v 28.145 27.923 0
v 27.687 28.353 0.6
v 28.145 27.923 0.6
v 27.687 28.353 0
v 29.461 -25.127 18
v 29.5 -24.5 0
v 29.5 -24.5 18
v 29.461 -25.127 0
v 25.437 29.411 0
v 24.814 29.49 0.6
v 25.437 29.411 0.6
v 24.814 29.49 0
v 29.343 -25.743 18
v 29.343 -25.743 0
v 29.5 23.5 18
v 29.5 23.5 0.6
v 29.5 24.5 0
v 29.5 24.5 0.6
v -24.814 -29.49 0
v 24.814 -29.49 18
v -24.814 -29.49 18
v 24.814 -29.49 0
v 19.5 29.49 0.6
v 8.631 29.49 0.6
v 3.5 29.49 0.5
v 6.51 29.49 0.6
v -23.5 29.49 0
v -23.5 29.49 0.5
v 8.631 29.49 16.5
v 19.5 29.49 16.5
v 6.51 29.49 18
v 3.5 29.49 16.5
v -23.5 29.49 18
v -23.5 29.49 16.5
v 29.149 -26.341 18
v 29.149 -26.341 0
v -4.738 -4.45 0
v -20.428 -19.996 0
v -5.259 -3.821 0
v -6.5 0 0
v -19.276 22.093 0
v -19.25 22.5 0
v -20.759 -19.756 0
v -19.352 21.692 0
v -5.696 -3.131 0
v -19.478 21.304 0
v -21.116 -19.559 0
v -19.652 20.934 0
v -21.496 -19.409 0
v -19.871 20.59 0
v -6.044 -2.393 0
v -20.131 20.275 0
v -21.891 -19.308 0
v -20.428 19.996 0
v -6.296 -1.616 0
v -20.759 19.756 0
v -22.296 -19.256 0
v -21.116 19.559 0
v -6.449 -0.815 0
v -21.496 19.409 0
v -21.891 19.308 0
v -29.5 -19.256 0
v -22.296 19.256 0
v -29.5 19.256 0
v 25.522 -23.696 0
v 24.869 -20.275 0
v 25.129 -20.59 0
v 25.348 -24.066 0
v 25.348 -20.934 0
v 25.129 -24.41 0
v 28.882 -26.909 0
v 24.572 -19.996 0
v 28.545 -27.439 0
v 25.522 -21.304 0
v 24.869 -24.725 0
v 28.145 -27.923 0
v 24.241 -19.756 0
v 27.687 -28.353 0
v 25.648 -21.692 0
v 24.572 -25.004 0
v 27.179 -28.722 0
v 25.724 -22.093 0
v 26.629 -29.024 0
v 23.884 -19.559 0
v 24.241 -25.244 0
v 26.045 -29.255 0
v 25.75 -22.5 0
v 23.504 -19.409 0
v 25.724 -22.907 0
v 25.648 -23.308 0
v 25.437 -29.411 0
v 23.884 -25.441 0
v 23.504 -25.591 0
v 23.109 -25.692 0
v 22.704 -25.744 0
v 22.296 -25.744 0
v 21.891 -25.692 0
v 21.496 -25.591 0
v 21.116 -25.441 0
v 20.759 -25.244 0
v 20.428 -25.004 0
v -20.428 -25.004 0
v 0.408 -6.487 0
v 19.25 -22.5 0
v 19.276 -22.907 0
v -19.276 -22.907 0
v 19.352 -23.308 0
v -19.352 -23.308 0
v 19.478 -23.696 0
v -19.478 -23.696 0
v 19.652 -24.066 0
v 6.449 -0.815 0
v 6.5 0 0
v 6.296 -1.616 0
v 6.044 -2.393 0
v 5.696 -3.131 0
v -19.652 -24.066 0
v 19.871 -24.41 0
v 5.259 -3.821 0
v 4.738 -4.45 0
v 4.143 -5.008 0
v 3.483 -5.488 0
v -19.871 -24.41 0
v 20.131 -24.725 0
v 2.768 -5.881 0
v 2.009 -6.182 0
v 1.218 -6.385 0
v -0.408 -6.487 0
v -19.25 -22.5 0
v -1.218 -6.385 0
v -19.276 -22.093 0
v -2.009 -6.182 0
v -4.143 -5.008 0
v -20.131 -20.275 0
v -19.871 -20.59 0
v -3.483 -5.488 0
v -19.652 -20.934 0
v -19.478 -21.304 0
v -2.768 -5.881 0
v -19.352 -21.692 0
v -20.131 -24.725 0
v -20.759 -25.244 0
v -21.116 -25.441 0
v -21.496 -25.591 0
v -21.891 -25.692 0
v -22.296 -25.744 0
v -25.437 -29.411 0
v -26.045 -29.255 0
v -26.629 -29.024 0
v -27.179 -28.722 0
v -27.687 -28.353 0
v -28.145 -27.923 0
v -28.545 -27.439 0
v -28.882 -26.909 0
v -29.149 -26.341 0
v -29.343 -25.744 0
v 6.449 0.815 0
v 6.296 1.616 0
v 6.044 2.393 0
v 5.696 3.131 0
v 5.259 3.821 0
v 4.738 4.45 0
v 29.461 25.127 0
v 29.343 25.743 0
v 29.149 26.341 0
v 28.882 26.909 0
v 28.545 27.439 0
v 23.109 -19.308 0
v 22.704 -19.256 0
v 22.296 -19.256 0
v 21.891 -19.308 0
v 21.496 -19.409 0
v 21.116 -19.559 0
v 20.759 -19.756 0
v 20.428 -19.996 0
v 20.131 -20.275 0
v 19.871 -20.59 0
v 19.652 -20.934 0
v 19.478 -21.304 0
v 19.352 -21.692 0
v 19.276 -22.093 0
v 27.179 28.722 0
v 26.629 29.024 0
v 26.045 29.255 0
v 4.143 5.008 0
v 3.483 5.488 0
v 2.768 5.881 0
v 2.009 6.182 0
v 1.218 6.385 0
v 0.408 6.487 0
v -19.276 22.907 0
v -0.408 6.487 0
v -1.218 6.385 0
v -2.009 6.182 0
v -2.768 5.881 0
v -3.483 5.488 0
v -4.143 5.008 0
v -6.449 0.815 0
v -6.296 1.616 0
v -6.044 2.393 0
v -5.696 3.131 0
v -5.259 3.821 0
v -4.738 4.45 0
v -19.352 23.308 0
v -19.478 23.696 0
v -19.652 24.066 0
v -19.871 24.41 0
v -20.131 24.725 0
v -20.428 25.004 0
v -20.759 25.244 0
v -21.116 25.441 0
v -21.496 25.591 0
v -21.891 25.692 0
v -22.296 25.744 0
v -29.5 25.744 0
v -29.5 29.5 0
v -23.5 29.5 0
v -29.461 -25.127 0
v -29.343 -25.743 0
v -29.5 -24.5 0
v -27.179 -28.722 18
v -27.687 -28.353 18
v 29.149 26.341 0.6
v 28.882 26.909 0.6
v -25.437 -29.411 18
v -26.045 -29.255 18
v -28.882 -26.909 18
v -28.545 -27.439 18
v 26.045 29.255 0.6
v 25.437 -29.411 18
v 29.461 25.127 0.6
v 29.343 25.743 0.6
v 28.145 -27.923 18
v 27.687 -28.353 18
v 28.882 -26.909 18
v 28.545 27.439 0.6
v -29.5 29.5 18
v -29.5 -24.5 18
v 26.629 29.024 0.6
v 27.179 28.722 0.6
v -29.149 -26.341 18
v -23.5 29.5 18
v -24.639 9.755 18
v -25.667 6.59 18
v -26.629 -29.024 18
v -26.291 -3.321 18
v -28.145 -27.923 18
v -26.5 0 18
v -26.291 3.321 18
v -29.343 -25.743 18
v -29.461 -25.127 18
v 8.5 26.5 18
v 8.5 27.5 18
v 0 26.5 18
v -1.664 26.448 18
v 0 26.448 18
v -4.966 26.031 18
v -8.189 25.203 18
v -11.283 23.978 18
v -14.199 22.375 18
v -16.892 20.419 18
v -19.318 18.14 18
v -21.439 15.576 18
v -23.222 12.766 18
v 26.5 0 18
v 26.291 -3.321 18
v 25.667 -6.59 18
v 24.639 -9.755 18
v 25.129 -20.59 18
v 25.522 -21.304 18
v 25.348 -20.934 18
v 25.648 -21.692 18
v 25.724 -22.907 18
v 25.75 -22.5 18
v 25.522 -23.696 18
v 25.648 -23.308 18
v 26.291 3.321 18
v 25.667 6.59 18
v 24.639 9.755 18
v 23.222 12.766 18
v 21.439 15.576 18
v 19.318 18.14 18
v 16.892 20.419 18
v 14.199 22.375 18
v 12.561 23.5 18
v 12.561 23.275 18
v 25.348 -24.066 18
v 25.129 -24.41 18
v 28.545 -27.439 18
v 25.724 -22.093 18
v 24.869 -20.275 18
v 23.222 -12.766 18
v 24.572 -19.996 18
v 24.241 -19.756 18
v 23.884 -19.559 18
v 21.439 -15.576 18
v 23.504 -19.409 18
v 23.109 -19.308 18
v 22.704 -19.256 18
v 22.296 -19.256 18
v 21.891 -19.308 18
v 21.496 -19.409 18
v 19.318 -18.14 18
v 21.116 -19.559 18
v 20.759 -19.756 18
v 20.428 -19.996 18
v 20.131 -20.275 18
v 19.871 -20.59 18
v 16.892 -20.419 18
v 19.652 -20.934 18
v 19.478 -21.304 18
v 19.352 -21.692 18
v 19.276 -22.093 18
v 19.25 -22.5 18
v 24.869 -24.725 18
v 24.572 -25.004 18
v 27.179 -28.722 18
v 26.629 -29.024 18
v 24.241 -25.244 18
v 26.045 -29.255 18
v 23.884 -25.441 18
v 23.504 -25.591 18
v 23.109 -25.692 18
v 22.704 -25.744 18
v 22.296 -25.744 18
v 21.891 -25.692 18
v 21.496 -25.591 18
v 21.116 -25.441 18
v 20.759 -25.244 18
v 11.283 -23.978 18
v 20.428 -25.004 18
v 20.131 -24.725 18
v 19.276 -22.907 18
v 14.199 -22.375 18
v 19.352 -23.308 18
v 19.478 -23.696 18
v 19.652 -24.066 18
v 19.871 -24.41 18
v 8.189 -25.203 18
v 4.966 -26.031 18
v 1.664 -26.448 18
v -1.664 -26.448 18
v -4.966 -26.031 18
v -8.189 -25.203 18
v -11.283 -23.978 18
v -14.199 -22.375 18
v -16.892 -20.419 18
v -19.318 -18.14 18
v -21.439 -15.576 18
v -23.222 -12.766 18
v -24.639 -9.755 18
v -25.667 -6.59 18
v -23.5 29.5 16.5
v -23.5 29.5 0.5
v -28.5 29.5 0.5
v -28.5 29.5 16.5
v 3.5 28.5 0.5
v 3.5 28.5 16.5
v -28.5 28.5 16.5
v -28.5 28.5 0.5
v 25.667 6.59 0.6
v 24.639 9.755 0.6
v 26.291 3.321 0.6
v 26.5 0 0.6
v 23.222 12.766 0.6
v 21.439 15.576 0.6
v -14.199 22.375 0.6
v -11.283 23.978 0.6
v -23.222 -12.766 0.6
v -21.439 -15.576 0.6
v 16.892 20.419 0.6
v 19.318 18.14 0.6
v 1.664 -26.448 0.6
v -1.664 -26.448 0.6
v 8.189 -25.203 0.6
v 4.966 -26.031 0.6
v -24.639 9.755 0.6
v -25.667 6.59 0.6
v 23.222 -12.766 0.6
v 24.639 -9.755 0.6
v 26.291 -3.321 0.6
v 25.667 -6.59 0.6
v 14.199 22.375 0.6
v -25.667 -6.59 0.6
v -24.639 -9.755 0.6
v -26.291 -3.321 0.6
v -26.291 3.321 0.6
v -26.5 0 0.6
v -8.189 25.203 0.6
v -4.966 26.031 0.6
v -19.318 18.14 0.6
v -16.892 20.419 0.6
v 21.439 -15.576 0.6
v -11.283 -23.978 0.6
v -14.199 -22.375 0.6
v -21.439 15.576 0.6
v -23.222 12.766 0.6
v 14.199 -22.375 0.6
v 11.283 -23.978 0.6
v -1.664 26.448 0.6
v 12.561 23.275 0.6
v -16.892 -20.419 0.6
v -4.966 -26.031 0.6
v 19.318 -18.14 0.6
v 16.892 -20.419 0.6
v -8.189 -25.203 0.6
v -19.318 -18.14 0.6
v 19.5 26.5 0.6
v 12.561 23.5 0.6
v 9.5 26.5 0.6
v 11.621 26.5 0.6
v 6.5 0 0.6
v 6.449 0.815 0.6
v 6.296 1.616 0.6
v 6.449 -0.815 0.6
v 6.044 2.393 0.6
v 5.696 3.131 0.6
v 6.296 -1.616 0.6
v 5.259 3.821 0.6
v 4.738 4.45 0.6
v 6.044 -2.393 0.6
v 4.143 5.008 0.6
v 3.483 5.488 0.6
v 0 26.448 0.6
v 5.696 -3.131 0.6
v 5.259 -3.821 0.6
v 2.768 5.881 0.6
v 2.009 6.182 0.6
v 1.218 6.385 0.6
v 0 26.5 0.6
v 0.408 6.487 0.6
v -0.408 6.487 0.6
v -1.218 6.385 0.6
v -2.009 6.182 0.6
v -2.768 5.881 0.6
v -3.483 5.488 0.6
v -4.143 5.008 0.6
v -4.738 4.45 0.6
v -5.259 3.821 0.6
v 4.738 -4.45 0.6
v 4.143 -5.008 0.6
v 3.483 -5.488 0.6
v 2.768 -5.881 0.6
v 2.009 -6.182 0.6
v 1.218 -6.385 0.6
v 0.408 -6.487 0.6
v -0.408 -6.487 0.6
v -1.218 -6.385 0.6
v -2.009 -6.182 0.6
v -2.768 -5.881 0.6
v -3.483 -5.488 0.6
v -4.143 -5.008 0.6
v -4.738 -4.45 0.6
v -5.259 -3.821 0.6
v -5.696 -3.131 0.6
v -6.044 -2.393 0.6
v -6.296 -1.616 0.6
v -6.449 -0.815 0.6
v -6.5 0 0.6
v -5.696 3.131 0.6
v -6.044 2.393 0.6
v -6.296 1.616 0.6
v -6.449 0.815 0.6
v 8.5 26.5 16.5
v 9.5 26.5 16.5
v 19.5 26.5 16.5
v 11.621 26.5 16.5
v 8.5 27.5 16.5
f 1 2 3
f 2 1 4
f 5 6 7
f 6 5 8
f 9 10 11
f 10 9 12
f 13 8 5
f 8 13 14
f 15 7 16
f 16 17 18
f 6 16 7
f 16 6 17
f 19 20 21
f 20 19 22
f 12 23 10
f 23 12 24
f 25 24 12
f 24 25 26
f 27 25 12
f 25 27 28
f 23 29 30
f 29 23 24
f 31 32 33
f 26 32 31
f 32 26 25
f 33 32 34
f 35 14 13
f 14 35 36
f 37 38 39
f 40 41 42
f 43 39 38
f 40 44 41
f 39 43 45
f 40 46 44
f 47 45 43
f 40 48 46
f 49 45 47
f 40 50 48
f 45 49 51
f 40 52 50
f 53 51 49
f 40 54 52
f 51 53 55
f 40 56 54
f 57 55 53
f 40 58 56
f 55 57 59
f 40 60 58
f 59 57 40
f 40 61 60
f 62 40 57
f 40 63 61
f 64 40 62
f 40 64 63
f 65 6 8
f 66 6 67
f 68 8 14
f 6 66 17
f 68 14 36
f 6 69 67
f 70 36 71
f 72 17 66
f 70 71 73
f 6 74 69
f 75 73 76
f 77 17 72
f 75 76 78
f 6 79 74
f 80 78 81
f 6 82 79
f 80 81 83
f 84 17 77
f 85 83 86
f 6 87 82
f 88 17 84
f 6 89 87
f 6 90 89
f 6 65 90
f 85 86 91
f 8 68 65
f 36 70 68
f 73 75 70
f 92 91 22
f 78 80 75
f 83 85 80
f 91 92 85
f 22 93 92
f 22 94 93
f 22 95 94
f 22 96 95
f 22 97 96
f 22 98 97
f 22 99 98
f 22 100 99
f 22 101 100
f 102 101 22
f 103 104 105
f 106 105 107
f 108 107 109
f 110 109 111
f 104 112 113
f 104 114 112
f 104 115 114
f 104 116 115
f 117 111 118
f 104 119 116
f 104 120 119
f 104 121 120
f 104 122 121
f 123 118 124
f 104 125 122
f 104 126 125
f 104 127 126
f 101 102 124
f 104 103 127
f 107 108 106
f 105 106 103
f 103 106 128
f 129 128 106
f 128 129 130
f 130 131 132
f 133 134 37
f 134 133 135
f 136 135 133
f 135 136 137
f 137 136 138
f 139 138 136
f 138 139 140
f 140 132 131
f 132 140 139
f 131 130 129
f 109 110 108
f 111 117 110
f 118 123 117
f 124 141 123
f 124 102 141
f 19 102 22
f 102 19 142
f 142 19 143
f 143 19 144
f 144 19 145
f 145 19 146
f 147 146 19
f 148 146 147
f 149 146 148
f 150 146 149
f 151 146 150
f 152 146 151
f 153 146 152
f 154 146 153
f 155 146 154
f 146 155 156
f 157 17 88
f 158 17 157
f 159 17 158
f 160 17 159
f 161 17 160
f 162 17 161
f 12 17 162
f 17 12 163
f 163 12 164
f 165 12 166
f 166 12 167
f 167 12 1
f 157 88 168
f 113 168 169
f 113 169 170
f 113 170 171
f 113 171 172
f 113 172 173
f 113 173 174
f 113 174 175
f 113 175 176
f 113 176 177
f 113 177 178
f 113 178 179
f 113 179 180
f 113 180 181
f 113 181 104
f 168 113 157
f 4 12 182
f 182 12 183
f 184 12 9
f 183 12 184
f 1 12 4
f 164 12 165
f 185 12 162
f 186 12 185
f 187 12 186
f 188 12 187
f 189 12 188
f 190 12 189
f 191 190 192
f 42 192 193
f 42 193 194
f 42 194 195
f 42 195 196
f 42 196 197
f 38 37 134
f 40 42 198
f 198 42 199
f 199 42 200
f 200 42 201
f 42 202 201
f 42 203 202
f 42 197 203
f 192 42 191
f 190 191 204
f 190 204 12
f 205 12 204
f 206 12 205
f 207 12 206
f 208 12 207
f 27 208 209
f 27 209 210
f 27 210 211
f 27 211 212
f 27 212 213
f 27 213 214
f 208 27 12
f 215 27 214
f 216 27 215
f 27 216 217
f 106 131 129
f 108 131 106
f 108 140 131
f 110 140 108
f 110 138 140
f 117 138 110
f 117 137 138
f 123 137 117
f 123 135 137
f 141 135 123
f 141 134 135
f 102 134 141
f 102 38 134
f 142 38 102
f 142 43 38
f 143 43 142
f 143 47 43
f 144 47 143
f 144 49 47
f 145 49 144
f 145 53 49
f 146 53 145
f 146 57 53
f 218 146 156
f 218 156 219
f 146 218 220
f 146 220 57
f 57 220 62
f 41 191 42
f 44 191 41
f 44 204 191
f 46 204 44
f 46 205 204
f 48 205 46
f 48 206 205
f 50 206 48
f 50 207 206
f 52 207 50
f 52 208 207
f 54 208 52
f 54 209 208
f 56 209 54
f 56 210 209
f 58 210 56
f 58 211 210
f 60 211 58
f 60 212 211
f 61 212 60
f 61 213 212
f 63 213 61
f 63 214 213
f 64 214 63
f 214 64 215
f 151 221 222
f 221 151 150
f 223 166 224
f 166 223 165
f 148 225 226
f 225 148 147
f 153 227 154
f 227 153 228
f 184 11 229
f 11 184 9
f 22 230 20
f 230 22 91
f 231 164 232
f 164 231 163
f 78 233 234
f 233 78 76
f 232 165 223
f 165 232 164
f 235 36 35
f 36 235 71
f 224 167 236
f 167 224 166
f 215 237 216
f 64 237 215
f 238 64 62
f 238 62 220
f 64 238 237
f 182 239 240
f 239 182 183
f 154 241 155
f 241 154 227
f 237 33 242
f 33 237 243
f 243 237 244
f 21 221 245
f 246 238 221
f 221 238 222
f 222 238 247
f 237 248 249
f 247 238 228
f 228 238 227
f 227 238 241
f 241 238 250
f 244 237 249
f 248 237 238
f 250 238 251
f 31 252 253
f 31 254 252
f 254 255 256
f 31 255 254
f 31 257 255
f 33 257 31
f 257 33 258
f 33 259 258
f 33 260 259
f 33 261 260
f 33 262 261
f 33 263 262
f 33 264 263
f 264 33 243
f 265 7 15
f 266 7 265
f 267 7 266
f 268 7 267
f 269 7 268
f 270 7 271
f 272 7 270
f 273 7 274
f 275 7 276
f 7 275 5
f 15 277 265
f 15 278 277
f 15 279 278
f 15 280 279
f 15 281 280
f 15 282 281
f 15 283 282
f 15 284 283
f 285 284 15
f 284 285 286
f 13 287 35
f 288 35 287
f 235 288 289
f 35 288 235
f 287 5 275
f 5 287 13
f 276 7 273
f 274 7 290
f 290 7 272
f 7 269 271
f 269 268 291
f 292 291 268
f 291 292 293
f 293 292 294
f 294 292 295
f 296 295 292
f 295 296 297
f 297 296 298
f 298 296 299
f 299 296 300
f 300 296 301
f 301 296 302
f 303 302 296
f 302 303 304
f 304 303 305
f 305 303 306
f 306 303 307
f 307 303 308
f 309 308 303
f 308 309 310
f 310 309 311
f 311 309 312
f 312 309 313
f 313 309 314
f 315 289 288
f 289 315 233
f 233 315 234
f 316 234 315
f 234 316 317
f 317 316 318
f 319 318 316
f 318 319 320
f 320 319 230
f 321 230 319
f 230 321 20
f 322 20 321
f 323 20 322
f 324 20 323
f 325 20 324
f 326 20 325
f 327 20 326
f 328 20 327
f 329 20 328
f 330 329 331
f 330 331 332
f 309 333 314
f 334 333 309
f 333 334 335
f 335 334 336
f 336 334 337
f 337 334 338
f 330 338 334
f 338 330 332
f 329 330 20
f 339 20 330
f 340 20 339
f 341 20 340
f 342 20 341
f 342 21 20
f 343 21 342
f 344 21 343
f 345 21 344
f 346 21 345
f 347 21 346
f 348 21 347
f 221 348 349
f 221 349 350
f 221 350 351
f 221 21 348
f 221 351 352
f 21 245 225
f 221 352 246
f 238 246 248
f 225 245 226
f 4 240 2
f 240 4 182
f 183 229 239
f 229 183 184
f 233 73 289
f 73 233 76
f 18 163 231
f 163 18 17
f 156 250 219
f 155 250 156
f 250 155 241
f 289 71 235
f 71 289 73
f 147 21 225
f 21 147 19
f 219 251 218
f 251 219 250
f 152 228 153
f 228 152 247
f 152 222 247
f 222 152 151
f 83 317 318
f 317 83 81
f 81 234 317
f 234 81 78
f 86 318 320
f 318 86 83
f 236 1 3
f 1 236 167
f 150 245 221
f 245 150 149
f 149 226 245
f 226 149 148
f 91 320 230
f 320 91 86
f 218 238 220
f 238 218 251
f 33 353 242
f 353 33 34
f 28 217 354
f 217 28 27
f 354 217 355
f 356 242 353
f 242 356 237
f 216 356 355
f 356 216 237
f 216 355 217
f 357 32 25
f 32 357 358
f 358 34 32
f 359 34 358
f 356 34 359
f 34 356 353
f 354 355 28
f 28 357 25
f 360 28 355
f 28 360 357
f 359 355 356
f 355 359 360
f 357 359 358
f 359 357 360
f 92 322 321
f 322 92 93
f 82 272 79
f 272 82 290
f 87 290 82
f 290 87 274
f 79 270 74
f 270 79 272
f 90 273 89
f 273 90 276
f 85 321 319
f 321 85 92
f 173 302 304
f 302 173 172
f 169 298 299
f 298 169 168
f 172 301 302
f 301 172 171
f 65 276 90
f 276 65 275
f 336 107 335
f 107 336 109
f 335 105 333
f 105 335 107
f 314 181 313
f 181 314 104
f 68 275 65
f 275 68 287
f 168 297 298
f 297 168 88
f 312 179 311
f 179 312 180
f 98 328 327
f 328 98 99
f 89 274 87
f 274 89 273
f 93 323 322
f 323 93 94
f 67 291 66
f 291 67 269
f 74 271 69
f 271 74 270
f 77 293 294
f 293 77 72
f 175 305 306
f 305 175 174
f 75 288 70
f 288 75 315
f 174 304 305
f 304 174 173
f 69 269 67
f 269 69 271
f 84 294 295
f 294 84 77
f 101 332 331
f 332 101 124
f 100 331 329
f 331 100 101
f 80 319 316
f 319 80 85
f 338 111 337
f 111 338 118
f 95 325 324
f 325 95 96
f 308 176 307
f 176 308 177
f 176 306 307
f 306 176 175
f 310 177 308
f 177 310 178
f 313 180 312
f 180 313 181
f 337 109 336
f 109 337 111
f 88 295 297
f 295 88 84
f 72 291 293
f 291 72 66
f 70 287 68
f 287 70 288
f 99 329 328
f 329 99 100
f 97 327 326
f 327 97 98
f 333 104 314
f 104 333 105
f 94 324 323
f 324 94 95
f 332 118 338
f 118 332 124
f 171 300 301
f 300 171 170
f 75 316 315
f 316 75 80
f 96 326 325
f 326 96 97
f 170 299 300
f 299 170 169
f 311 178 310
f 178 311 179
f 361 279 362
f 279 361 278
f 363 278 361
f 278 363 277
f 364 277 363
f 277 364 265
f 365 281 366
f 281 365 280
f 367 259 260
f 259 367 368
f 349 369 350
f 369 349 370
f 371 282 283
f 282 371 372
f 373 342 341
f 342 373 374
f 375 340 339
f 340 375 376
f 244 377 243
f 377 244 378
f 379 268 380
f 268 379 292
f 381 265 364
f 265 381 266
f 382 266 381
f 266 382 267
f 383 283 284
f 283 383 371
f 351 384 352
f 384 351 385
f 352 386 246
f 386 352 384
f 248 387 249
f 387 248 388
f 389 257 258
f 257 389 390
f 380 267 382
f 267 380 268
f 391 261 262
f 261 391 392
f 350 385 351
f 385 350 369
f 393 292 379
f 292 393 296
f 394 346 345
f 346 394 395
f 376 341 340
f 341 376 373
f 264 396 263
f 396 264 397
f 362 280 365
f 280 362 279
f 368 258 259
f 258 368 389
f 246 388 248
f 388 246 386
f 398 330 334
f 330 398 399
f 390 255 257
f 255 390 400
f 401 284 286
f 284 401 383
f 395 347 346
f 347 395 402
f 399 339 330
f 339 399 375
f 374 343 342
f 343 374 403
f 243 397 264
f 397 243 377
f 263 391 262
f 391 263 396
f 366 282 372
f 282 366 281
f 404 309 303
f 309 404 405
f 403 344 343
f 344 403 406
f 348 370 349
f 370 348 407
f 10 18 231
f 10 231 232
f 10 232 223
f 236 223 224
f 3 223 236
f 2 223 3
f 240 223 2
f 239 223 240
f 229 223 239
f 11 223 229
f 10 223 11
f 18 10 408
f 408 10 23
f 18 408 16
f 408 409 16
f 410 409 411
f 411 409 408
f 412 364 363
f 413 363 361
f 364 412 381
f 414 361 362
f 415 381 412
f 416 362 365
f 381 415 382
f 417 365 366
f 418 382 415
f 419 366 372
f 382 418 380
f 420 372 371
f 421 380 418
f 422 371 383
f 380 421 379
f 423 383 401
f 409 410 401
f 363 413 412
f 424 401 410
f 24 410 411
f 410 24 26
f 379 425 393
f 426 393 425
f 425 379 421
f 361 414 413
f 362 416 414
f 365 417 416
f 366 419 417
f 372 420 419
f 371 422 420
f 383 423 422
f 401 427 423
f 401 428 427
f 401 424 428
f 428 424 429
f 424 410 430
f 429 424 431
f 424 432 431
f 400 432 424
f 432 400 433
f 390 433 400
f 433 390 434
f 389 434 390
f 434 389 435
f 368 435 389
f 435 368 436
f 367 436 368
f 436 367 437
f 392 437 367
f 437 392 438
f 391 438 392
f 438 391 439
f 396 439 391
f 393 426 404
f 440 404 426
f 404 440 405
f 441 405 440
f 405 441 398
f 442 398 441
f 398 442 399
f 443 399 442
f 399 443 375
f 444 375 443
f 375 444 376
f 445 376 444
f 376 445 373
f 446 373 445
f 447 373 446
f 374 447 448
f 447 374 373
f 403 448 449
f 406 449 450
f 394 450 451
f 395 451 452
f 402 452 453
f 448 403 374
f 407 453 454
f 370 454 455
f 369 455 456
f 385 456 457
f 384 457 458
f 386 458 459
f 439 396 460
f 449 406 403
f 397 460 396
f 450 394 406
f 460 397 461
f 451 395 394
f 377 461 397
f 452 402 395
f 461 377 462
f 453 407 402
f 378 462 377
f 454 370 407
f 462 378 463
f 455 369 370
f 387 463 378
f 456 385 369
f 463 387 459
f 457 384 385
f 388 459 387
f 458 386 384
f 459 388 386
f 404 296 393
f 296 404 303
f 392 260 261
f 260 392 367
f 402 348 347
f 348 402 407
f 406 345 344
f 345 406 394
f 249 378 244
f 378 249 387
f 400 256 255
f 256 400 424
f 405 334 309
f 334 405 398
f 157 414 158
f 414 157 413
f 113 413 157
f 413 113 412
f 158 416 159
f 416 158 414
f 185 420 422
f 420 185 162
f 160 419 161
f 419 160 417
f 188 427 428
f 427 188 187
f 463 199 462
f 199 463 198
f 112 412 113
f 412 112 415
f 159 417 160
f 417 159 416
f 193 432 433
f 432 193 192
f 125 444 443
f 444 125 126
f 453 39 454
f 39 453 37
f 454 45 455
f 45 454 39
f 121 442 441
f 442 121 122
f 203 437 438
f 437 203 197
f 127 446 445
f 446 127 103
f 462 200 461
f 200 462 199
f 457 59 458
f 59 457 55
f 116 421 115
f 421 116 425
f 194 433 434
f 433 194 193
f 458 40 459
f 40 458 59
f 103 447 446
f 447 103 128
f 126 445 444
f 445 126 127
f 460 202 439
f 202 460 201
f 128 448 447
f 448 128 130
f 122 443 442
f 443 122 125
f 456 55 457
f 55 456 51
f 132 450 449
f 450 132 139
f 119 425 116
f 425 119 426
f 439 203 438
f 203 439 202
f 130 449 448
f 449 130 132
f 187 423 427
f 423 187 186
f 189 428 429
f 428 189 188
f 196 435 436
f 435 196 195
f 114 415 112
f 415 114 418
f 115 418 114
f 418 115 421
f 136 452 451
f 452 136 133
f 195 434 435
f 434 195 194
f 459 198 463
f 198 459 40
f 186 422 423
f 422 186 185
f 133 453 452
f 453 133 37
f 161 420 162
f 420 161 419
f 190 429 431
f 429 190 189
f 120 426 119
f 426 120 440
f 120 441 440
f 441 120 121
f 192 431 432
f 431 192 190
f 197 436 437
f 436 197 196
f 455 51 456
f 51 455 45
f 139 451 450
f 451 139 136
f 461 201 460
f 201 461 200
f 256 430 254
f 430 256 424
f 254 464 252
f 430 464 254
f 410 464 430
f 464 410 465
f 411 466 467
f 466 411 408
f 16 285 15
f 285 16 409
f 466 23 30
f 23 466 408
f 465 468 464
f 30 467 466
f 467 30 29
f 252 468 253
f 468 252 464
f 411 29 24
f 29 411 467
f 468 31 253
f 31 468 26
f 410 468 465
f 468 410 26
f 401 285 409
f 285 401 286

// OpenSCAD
$fn = 50;


difference() {
	union() {
		hull() {
			translate(v = [-24.5000000000, 24.5000000000, 0]) {
				cylinder(h = 18, r = 5);
			}
			translate(v = [24.5000000000, 24.5000000000, 0]) {
				cylinder(h = 18, r = 5);
			}
			translate(v = [-24.5000000000, -24.5000000000, 0]) {
				cylinder(h = 18, r = 5);
			}
			translate(v = [24.5000000000, -24.5000000000, 0]) {
				cylinder(h = 18, r = 5);
			}
		}
		translate(v = [-29.5000000000, 23.5000000000, 0]) {
			cube(size = [6, 6, 18]);
		}
	}
	union() {
		translate(v = [-30.0000000000, -22.5000000000, -250.0000000000]) {
			rotate(a = [0, 0, 0]) {
				difference() {
					union() {
						hull() {
							translate(v = [7.5000000000, 0, 0]) {
								cylinder(h = 250, r = 3.2500000000, r1 = 3.2500000000, r2 = 3.2500000000);
							}
							translate(v = [-7.5000000000, 0, 0]) {
								cylinder(h = 250, r = 3.2500000000, r1 = 3.2500000000, r2 = 3.2500000000);
							}
						}
					}
					union();
				}
			}
		}
		translate(v = [-30.0000000000, 22.5000000000, -250.0000000000]) {
			rotate(a = [0, 0, 0]) {
				difference() {
					union() {
						hull() {
							translate(v = [7.5000000000, 0, 0]) {
								cylinder(h = 250, r = 3.2500000000, r1 = 3.2500000000, r2 = 3.2500000000);
							}
							translate(v = [-7.5000000000, 0, 0]) {
								cylinder(h = 250, r = 3.2500000000, r1 = 3.2500000000, r2 = 3.2500000000);
							}
						}
					}
					union();
				}
			}
		}
		translate(v = [-28.5000000000, 28.5000000000, 0.5000000000]) {
			cube(size = [32, 1, 16]);
		}
		translate(v = [22.5000000000, -22.5000000000, -50.0000000000]) {
			cylinder(h = 100, r = 3.2500000000);
		}
		translate(v = [0, 0, 0.6000000000]) {
			cylinder(h = 20.4000000000, r = 26.5000000000);
		}
		translate(v = [0, 0, -9.0000000000]) {
			cylinder(h = 18, r = 6.5000000000);
		}
		translate(v = [0.0000000000, 23.5000000000, 0.6000000000]) {
			cube(size = [29.5000000000, 3, 20.4000000000]);
		}
		translate(v = [19.5000000000, 23.5000000000, 0.6000000000]) {
			cube(size = [10, 6, 20.4000000000]);
		}
		translate(v = [8.5000000000, 23.5000000000, 16.5000000000]) {
			cube(size = [21, 6, 1.5000000000]);
		}
		translate(v = [5.7500000000, 30.2500000000, 0.6000000000]) {
			rotate(a = [0, 0, -45]) {
				cube(size = [7.5000000000, 1.5000000000, 20.4000000000]);
			}
		}
		translate(v = [5.0610000000, 21.5000000000, 0.6000000000]) {
			cube(size = [7.5000000000, 2, 17.4000000000]);
		}
	}
}
